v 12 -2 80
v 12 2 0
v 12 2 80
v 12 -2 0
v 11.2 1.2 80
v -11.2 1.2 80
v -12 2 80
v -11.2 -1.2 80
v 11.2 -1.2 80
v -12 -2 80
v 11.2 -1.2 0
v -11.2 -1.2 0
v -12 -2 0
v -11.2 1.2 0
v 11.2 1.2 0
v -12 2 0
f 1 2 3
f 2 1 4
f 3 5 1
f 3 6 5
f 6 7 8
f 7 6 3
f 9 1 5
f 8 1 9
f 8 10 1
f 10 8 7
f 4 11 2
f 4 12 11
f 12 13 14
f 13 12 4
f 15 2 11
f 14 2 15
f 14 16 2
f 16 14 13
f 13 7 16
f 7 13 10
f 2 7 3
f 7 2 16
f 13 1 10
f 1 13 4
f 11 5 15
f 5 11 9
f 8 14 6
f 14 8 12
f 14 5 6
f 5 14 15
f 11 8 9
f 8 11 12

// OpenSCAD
    difference(){
        translate([0,0, 40])cube([24,4,80],center=true);
        translate([0,0, 40])cube([22.4,2.4,99],center=true);
    }
